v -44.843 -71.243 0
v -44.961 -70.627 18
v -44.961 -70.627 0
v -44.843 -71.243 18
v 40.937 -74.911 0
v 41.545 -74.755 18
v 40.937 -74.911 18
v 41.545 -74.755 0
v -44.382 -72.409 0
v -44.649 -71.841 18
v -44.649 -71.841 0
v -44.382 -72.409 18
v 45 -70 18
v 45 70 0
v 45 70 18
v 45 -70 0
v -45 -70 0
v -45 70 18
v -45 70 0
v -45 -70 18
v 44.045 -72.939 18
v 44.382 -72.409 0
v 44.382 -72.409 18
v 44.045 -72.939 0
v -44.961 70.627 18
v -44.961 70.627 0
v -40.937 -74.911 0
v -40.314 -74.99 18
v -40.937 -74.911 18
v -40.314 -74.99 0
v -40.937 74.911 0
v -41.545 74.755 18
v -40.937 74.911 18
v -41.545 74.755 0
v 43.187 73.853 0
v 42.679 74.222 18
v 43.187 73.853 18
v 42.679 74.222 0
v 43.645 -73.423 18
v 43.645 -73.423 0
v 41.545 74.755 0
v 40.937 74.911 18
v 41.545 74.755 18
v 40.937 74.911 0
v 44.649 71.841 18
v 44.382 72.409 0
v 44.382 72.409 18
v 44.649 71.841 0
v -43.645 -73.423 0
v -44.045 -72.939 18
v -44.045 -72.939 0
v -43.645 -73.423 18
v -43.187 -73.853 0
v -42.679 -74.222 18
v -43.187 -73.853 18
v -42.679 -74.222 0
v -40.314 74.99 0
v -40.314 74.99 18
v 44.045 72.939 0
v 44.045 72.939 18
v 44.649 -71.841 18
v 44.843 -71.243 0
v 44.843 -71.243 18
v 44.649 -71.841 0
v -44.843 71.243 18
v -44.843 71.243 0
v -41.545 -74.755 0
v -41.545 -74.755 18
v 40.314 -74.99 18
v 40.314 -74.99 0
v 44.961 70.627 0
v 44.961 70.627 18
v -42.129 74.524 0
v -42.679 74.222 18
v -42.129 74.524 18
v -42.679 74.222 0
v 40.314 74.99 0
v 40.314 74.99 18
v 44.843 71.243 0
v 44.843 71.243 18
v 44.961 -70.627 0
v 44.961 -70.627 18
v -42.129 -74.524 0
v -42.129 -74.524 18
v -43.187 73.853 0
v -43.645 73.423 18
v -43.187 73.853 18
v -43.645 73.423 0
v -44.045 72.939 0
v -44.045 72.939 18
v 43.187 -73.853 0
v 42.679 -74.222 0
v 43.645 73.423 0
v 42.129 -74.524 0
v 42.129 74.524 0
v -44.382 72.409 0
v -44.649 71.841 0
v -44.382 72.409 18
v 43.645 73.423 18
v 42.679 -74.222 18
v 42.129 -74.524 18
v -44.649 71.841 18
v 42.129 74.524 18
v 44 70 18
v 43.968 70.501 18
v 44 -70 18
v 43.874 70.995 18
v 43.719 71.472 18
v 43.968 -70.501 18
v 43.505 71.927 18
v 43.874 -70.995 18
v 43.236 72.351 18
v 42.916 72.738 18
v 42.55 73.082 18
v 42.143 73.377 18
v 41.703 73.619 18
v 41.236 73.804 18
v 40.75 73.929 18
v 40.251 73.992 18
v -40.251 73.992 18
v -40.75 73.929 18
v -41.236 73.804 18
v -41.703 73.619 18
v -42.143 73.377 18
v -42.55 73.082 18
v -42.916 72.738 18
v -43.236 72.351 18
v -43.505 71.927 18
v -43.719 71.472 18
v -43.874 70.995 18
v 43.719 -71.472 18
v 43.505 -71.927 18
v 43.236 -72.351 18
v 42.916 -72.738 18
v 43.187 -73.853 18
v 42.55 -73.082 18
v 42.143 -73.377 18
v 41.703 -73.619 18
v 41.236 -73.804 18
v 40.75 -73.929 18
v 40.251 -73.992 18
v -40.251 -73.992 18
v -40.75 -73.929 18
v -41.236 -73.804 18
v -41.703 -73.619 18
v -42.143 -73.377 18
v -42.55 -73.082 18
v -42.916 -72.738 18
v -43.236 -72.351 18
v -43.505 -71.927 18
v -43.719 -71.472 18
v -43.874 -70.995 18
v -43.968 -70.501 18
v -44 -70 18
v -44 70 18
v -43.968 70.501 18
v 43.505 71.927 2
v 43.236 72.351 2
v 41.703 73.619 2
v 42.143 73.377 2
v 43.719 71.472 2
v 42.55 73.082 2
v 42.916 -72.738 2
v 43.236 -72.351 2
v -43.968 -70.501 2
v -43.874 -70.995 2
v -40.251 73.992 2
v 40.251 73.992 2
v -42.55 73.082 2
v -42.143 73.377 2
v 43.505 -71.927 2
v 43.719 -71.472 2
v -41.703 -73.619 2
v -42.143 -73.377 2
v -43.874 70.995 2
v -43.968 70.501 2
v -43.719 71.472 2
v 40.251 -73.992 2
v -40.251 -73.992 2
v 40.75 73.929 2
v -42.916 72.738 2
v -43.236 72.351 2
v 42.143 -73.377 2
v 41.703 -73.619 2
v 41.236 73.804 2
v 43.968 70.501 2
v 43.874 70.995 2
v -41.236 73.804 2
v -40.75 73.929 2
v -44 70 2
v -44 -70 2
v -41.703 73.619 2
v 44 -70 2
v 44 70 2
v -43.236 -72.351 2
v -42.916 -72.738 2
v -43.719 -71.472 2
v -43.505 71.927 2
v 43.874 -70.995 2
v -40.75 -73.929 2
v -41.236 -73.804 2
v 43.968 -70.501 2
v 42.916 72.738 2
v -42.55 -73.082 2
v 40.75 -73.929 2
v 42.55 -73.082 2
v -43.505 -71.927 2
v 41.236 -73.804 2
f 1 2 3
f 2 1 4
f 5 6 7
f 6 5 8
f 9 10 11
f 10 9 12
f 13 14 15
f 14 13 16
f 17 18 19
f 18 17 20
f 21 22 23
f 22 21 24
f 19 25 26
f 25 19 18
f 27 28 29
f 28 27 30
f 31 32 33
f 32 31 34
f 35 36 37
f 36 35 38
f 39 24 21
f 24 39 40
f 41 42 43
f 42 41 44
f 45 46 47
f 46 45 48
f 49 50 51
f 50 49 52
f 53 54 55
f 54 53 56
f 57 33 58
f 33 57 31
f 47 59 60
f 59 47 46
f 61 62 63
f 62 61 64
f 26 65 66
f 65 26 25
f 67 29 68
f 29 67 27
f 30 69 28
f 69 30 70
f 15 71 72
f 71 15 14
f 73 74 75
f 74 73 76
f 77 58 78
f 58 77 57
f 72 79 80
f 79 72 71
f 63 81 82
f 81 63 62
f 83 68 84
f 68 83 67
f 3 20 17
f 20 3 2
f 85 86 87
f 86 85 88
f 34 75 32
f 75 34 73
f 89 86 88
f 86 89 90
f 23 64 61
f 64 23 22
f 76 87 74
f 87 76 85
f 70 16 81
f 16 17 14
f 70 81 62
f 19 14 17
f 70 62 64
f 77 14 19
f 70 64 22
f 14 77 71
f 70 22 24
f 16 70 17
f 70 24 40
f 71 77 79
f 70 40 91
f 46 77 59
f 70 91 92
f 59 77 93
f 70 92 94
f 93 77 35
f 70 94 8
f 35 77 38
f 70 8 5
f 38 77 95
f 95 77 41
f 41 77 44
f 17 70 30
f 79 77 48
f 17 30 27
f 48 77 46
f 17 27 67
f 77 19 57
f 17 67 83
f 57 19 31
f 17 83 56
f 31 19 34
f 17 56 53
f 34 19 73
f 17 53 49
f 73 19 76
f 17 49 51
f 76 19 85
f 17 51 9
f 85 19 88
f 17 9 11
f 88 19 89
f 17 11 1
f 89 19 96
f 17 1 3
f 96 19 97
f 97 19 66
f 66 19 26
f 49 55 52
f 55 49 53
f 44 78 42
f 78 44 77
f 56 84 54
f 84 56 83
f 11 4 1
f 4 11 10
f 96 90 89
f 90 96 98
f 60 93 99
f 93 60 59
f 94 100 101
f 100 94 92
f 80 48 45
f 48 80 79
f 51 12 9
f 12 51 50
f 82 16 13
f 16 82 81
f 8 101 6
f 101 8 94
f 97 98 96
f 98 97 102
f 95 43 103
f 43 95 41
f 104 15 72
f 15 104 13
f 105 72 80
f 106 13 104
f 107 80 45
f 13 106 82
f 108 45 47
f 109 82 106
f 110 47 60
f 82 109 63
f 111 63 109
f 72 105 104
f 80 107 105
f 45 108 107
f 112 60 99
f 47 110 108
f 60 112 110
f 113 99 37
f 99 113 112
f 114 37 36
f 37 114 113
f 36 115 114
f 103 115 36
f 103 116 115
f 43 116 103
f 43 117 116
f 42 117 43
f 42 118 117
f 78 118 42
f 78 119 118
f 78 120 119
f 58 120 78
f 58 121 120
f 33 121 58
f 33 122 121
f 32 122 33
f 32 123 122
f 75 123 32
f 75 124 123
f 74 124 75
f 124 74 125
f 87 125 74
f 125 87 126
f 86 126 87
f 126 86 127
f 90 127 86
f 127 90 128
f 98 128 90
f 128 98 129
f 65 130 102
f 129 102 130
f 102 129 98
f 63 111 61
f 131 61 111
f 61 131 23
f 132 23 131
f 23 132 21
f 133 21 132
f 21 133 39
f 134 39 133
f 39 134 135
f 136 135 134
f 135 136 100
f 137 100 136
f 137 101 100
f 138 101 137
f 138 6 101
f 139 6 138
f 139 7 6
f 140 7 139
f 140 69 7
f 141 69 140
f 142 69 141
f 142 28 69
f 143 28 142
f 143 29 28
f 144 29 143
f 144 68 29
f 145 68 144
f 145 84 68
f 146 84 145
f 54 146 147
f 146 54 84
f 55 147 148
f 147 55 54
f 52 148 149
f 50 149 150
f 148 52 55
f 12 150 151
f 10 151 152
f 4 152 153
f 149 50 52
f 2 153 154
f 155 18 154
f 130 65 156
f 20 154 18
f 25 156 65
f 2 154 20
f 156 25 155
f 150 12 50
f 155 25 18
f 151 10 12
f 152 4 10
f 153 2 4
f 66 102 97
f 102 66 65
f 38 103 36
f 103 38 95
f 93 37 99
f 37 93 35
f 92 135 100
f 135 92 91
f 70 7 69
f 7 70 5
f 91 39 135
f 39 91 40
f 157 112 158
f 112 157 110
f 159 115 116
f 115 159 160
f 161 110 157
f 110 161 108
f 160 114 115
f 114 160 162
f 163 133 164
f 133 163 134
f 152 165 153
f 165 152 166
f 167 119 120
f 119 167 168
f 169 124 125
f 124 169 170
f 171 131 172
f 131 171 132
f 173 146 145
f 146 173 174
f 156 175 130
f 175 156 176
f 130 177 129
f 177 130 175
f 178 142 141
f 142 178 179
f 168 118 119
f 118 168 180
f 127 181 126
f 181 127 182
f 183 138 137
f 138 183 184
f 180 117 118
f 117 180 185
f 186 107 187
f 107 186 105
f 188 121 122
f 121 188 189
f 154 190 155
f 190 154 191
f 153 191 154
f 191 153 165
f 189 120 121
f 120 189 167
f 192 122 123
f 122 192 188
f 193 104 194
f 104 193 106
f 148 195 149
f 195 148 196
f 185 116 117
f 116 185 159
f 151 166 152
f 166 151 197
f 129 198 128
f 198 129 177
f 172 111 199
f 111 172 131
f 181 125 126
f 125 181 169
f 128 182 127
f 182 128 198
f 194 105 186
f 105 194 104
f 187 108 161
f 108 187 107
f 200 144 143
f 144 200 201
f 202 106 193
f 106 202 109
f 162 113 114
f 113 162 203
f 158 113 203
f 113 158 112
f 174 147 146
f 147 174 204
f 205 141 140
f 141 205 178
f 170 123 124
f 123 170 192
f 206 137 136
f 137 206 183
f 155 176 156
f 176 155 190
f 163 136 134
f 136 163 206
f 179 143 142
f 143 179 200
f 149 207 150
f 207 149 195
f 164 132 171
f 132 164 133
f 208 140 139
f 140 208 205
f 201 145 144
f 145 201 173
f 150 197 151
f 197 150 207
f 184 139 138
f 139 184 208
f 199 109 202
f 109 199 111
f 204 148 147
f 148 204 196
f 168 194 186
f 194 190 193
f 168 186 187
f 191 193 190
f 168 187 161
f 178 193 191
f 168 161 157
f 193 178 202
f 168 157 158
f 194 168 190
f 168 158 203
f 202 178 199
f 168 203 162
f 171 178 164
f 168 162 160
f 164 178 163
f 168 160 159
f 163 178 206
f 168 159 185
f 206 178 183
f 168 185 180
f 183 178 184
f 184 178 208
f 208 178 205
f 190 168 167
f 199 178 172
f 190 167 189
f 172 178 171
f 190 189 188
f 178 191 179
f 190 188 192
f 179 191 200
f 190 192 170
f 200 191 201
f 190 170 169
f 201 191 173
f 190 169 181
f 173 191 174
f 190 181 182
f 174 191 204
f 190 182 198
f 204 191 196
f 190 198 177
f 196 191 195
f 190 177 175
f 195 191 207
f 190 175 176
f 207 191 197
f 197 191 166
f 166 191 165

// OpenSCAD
$fn = 50;


difference() {
	union() {
		hull() {
			translate(v = [-40.0000000000, 70.0000000000, 0]) {
				cylinder(h = 18, r = 5);
			}
			translate(v = [40.0000000000, 70.0000000000, 0]) {
				cylinder(h = 18, r = 5);
			}
			translate(v = [-40.0000000000, -70.0000000000, 0]) {
				cylinder(h = 18, r = 5);
			}
			translate(v = [40.0000000000, -70.0000000000, 0]) {
				cylinder(h = 18, r = 5);
			}
		}
	}
	union() {
		translate(v = [0, 0, 2]) {
			hull() {
				translate(v = [-40.0000000000, 70.0000000000, 0]) {
					cylinder(h = 16, r = 4);
				}
				translate(v = [40.0000000000, 70.0000000000, 0]) {
					cylinder(h = 16, r = 4);
				}
				translate(v = [-40.0000000000, -70.0000000000, 0]) {
					cylinder(h = 16, r = 4);
				}
				translate(v = [40.0000000000, -70.0000000000, 0]) {
					cylinder(h = 16, r = 4);
				}
			}
		}
	}
}
